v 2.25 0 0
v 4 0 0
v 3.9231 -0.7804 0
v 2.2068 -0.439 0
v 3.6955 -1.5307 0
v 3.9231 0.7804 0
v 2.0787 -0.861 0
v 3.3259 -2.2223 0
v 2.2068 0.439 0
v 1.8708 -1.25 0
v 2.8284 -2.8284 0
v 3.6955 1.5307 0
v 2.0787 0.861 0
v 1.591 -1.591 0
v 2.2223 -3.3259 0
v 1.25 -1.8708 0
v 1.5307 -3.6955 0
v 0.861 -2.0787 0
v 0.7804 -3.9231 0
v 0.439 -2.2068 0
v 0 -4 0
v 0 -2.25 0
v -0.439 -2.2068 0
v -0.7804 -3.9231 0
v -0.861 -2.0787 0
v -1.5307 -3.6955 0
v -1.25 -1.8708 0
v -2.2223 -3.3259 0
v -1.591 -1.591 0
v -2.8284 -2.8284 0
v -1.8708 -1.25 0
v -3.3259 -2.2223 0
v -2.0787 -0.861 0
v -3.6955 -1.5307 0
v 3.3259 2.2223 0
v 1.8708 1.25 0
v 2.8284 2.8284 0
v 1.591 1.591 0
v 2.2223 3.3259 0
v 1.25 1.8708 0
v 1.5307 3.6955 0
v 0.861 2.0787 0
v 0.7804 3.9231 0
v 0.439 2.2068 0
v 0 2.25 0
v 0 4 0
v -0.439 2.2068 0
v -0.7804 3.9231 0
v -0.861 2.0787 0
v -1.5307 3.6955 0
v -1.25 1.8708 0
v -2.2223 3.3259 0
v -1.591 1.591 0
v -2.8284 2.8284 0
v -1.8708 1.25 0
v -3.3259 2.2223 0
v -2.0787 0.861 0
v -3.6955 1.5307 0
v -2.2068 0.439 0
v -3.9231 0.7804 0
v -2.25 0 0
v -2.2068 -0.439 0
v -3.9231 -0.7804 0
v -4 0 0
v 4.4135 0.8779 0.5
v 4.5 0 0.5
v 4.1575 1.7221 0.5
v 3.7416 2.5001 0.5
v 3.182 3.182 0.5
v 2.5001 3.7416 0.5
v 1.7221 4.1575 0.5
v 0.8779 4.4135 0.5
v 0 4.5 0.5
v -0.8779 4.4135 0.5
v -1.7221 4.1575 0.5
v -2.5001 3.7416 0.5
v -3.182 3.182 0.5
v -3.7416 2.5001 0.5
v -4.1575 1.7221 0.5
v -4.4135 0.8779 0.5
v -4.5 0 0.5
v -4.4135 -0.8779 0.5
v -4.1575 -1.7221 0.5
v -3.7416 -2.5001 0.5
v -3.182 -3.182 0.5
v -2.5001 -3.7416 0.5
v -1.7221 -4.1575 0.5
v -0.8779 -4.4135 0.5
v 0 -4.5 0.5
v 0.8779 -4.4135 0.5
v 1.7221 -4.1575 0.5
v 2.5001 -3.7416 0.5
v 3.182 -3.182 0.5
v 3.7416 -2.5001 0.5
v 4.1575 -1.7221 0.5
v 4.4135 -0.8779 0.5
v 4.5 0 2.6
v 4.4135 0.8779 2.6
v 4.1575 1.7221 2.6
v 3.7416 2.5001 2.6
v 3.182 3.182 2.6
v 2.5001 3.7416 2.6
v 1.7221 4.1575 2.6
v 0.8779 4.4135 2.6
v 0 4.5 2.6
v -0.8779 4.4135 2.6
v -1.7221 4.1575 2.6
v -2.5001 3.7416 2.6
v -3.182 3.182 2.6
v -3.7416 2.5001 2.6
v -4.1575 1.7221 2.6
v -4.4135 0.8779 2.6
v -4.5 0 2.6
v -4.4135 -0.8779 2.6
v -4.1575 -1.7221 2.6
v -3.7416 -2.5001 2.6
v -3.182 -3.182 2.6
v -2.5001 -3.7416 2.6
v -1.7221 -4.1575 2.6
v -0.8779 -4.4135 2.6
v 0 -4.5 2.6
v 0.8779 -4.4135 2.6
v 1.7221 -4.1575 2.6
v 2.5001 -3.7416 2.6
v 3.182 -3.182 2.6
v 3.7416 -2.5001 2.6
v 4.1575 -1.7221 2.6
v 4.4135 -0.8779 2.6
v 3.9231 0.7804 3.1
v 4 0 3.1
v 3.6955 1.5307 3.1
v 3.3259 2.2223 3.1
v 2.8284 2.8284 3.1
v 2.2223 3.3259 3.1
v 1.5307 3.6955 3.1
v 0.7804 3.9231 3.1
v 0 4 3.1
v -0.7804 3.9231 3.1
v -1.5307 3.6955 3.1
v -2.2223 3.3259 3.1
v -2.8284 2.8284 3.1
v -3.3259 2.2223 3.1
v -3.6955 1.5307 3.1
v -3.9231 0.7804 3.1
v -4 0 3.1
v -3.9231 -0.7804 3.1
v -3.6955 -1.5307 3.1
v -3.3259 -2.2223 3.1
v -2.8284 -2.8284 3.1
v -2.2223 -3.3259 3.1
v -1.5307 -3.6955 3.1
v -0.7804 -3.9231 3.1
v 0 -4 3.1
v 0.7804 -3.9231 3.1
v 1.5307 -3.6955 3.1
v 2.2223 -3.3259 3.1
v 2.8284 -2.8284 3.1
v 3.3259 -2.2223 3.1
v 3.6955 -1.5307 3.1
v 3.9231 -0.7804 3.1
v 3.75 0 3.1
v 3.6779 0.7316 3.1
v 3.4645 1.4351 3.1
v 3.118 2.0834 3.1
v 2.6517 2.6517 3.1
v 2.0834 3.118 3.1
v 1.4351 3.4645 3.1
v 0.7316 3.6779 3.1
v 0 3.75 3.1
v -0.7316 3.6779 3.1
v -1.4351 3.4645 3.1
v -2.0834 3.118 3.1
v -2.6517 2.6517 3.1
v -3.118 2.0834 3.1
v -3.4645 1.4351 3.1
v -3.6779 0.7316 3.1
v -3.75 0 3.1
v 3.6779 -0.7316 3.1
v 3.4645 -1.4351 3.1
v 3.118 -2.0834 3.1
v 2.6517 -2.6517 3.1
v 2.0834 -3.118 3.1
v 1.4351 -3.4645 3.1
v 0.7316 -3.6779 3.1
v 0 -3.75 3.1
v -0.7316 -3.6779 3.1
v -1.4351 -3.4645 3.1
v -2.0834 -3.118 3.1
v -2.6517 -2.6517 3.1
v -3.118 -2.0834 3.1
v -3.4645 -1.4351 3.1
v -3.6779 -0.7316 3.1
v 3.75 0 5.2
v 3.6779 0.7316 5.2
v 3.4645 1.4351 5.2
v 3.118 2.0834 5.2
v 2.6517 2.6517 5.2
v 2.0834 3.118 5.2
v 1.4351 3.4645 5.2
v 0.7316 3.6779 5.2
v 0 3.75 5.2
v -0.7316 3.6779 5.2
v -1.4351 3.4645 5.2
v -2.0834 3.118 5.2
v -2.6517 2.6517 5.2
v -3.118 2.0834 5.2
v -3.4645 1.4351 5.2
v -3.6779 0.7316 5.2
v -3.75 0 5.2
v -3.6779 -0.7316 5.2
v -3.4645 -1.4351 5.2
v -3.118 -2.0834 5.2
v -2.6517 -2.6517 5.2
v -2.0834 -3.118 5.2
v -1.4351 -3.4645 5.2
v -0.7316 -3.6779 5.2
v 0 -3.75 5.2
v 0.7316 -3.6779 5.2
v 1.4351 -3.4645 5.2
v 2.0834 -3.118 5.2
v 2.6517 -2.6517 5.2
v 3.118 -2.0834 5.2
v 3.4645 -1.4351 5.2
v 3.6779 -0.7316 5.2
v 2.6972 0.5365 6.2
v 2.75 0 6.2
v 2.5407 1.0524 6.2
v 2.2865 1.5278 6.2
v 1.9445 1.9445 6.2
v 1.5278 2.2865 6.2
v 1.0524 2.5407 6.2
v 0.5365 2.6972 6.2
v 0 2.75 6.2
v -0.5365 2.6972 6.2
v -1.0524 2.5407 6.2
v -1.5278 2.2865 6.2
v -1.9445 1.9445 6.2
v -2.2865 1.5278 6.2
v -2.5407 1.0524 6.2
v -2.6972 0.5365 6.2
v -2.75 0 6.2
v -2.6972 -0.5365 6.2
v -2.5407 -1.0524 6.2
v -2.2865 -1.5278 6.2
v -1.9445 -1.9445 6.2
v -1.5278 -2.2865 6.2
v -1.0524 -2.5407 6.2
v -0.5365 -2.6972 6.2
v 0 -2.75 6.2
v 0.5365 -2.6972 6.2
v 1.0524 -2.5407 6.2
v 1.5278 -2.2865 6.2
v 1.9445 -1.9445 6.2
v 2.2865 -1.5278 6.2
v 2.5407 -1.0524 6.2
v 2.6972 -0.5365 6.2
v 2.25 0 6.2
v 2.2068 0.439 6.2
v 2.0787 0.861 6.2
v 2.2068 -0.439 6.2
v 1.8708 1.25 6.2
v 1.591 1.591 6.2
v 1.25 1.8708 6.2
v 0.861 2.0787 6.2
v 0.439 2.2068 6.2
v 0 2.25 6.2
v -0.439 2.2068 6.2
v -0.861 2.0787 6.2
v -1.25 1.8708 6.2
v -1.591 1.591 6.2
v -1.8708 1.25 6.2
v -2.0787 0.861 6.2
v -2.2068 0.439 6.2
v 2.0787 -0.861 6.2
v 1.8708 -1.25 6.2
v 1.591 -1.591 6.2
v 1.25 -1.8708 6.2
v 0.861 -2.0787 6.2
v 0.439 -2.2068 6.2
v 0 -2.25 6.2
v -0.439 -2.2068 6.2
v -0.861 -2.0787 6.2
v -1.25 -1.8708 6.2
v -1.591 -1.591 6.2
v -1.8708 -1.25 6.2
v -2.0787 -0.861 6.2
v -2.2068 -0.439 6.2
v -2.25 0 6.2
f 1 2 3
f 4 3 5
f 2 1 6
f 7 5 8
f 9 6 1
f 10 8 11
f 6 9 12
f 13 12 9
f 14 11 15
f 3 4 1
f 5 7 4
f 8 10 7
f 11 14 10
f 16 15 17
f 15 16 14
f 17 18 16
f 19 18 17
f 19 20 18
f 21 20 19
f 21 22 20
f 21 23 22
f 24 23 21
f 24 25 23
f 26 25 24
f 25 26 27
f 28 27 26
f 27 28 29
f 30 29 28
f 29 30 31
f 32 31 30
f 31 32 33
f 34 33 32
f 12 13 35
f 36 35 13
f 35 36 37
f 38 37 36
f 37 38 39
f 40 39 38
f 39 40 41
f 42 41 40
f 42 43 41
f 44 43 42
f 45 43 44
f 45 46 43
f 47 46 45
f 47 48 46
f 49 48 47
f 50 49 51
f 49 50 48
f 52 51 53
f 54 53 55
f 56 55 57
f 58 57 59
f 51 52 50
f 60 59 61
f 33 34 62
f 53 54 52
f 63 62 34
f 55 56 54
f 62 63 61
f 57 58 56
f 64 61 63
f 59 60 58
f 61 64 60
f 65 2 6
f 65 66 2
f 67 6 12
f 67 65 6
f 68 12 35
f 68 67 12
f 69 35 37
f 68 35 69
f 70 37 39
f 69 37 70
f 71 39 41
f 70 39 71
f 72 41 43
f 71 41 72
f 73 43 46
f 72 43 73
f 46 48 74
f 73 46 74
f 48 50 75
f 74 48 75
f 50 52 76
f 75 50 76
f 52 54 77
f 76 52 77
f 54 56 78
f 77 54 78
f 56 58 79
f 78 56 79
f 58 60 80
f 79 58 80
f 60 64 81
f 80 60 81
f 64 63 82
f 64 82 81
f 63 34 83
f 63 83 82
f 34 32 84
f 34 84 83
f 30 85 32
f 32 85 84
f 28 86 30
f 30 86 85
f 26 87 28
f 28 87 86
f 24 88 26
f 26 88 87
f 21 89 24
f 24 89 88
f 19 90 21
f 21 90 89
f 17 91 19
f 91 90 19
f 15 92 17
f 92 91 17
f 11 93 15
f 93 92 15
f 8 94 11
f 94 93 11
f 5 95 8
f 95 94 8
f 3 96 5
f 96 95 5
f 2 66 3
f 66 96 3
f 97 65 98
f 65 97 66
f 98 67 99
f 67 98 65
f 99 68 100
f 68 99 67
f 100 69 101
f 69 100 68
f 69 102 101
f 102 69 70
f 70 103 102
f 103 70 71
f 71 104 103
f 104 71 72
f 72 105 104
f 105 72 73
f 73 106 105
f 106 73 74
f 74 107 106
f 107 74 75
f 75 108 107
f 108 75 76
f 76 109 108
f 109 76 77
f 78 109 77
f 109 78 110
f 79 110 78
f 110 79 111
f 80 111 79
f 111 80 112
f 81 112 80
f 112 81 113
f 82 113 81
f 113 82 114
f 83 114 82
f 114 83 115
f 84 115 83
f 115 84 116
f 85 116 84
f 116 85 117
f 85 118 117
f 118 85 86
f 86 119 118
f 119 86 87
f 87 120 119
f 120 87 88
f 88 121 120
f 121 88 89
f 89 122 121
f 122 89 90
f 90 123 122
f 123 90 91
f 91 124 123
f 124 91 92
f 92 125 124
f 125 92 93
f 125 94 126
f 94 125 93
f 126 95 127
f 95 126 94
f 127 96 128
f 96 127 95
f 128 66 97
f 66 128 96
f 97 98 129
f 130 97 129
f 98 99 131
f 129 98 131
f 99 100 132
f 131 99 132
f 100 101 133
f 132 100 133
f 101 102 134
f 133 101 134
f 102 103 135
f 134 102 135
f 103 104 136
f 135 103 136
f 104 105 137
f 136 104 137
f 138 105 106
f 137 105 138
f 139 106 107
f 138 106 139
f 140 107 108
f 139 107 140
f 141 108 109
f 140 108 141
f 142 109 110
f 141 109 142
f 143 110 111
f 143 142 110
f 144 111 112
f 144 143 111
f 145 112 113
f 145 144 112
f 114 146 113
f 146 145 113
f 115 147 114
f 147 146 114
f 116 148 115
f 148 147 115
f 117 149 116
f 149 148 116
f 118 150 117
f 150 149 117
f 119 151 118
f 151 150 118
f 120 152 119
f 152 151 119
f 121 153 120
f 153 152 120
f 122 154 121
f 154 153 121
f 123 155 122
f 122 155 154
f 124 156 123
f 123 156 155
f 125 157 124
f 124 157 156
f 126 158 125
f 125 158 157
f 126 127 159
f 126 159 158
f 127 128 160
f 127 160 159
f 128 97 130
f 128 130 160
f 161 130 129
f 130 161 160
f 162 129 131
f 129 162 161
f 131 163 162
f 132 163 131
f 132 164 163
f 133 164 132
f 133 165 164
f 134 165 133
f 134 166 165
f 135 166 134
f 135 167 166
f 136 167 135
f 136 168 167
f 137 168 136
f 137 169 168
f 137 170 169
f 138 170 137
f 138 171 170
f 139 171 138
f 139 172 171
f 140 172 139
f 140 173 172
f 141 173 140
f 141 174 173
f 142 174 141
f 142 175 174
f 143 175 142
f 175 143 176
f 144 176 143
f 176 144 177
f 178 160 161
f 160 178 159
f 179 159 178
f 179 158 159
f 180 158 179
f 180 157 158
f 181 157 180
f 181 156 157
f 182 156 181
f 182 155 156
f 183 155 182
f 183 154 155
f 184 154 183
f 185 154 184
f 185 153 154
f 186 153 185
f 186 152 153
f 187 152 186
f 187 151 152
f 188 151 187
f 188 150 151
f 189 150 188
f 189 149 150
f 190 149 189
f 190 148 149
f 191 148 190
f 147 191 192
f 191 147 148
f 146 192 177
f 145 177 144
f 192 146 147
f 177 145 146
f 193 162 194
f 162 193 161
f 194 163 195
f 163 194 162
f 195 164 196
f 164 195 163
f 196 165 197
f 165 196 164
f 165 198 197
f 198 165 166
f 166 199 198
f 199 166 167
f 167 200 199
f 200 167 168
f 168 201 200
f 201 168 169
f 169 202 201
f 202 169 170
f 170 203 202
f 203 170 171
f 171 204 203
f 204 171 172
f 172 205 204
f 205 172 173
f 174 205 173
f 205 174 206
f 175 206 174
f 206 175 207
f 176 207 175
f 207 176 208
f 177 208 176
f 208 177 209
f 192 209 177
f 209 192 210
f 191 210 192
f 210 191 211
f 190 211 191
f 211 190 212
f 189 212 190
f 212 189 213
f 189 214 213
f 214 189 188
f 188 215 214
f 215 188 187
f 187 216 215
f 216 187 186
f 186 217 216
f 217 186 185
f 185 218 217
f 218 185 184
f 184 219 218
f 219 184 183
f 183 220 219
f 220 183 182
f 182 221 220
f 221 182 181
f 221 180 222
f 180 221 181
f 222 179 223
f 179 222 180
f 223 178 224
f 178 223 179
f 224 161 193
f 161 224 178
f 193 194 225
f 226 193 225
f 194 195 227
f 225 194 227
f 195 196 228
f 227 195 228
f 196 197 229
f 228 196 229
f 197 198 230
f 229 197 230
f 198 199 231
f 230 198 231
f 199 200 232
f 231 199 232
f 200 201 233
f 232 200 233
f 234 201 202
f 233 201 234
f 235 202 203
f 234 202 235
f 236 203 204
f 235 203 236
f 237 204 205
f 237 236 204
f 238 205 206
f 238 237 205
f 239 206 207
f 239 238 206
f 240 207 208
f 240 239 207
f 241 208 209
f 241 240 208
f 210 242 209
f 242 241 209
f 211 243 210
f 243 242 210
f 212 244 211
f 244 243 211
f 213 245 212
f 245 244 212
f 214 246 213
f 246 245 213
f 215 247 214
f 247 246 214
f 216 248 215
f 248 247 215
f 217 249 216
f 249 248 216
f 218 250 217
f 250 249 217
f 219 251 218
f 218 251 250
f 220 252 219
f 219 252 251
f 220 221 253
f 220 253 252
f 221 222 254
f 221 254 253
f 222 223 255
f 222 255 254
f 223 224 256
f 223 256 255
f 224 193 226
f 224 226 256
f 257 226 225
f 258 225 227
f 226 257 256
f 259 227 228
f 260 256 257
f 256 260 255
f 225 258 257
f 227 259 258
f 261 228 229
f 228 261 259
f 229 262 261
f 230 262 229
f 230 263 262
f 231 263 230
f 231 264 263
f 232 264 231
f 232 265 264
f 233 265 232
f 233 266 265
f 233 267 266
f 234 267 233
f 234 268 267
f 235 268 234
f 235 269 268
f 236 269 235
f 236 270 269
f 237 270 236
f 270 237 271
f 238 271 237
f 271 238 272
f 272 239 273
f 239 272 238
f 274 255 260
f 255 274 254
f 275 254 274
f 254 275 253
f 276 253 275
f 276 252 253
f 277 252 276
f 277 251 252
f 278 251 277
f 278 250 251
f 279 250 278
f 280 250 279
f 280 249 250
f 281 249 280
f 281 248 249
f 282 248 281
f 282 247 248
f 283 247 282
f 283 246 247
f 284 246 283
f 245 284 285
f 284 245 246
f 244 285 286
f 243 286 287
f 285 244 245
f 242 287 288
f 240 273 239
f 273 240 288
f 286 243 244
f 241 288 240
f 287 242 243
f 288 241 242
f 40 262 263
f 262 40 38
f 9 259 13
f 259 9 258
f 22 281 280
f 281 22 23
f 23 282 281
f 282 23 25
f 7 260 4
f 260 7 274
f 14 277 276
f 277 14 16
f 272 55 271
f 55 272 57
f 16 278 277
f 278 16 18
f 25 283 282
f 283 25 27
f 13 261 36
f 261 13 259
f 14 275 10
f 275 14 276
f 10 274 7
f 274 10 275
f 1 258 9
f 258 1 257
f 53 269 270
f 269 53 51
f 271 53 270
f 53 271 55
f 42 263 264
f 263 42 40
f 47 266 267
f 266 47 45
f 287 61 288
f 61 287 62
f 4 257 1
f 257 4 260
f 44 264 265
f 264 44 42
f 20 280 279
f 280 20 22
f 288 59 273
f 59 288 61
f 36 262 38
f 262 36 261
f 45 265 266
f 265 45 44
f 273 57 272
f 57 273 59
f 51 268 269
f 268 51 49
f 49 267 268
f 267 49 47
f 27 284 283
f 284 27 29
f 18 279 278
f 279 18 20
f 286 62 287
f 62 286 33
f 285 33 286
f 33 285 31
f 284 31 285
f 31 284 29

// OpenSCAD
// file: ../lib/TOGMod1Constructors.scad
// TOGMod1Constructors-v1.7
// 
// Functions to construct objects understood by TOGMod1
// 
// v1.1:
// - Add togmod1_make_rounded_rect
// v1.2:
// - togmod1_make_rounded_rect can make ovals
// v1.3:
// - togmod1_circle_points, to just get the points of a circle
// - if pos parameter to circle function has a third element,
//   returned vertexes will include it as the z component;
// v1.3.1
// - Some assertions
// v1.4:
// - Refactor togmod1_rounded_rect_points and togmod1_circle_points
//   to use togmod1__make_nd_vector_adder for adapting to whatever
//   `pos` parameter is.
// v1.5:
// - togmod_rounded_rect_points will not simplify completely rounded sides
//   (where length of side is exactly twice the rounding radius)
//   unless simplify_rounded_sides=true
//   - This makes it more useful for polyhedron generation,
//     where radius varies, but number of points must remain constant.
// v1.6:
// - togmod1_make_rect makes a simple rectangle
// - togmod1_make_rounded_rect will defer to togmod1_make_rect when r=0
// v1.7:
// - togmod1_make_circle will return empty shape (["union"]) when d=0

use <./TOGArrayLib1.scad>

function togmod1__make_nd_vector_adder(origin=[0,0]) =
	let(origin_is_zero = tal1_reduce(true, origin, function(prev,item) prev && item == 0))
	origin_is_zero ? (function(vec) len(vec) >= len(origin) ? vec : tal1_replace_at(origin, 0, vec)) :
	function(vec) [
		for(i=[0:1:max(len(origin),len(vec))-1]) (len(vec) > i ? vec[i] : 0) + (len(origin) > i ? origin[i] : 0),
	];

assert([1,2,3] == togmod1__make_nd_vector_adder()([1,2,3]));
echo(togmod1__make_nd_vector_adder([0,0,3])([1,2]));
assert([1,2,3] == togmod1__make_nd_vector_adder([0,0,3])([1,2]));


function togmod1_make_cuboid(size) =
	assert(is_list(size))
	assert(len(size) >= 3)
	assert(is_num(size[0]))
	assert(is_num(size[1]))
	assert(is_num(size[2]))
	["polyhedron-vf", [
		[-size[0]/2, -size[1]/2, -size[2]/2],
		[+size[0]/2, -size[1]/2, -size[2]/2],
		[-size[0]/2, +size[1]/2, -size[2]/2],
		[+size[0]/2, +size[1]/2, -size[2]/2],
		[-size[0]/2, -size[1]/2, +size[2]/2],
		[+size[0]/2, -size[1]/2, +size[2]/2],
		[-size[0]/2, +size[1]/2, +size[2]/2],
		[+size[0]/2, +size[1]/2, +size[2]/2]
	], [
		[0,1,3,2],[0,4,5,1],[4,6,7,5],[3,7,6,2],[1,5,7,3],[6,4,0,2]
	]];

function togmod1_make_polygon(verts) =
	["polygon-vp", verts, [[for( i=[0:1:len(verts)-1] ) i%len(verts)]]];

function togmod1_rounded_rect_points(size, r, pos=[0,0], simplify_rounded_sides=false) =
	assert(is_list(size))
	assert(len(size) >= 2)
	let(radii = is_list(r) ? r : is_num(r) ? [r,r] : assert(false, "rounded_rect r(adius) should be list<num> or num"))
	let(rx = radii[0])
	let(ry = radii[1])
	assert(is_num(rx))
	assert(is_num(ry))
	assert(size[0] >= 2*rx, str("size[0] must be >= 2*r[0]; size[0] = ",size[0],", 2*r[0] = ",2*rx))
	assert(size[1] >= 2*ry, str("size[1] must be >= 2*r[1]; size[1] = ",size[1],", 2*r[1] = ",2*ry))
	let(quarterfn=max($fn/4, 1))
	let(qfnx = simplify_rounded_sides && size[0] == 2*rx ? quarterfn-1 : quarterfn)
	let(qfny = simplify_rounded_sides && size[1] == 2*ry ? quarterfn-1 : quarterfn)
	let(finalizepos = togmod1__make_nd_vector_adder(pos))
[
	for(a=[0 : 1 : qfnx]) let(ang=      a*90/quarterfn) finalizepos([ size[0]/2-rx + rx*cos(ang),  size[1]/2-ry + ry*sin(ang)]),
	for(a=[0 : 1 : qfny]) let(ang= 90 + a*90/quarterfn) finalizepos([-size[0]/2+rx + rx*cos(ang),  size[1]/2-ry + ry*sin(ang)]),
	for(a=[0 : 1 : qfnx]) let(ang=180 + a*90/quarterfn) finalizepos([-size[0]/2+rx + rx*cos(ang), -size[1]/2+ry + ry*sin(ang)]),
	for(a=[0 : 1 : qfny]) let(ang=270 + a*90/quarterfn) finalizepos([ size[0]/2-rx + rx*cos(ang), -size[1]/2+ry + ry*sin(ang)]),
];

function togmod1_make_rect(size) =
	togmod1_make_polygon([
		[-size[0]/2, -size[1]/2],
		[+size[0]/2, -size[1]/2],
		[+size[0]/2, +size[1]/2],
		[-size[0]/2, +size[1]/2],
	]);

function togmod1_make_rounded_rect(size, r) =
	r == 0 ? togmod1_make_rect(size) :
	togmod1_make_polygon(togmod1_rounded_rect_points(size,r,simplify_rounded_sides=true));

function togmod1_circle_points(r, pos=[0,0], d=undef) =
	assert( !is_undef(r) || !is_undef(d) )
	assert(!is_undef(pos[0]))
	assert(!is_undef(pos[1]))
	let(finalizepos = togmod1__make_nd_vector_adder(pos))
	let(r_ = !is_undef(r) ? r : d/2)
	let(fn = max($fn, 6))
	[for(i=[0 : 1 : fn-1]) finalizepos([r_*cos(i*360/fn), r_*sin(i*360/fn)])];

function togmod1_make_circle(r, pos=[0,0], d=undef) =
	r == 0 || d == 0 ? ["union"] :
	togmod1_make_polygon(togmod1_circle_points(r=r, pos=pos, d=d));

function togmod1_make_cylinder(d, zrange=[0,1], r=undef, pos=[0,0]) =
	assert( !is_undef(r) || !is_undef(d) )
	let( r_ = !is_undef(r) ? r : d/2 )
	// TODO: Make polyhedron directly
	["linear-extrude-zs", zrange, togmod1_make_circle(r=r_, pos=pos)];

function togmod1__is_range1d(range) = is_list(range) && len(range) == 2 && is_num(range[0]) && is_num(range[1]);

function togmod1_linear_extrude_z(range, shape) =
	assert(togmod1__is_range1d(range))
	["linear-extrude-zs", range, shape];
function togmod1_linear_extrude_x(range, shape) =
	assert(togmod1__is_range1d(range))
	["rotate", [90, 0, 90], togmod1_linear_extrude_z(range, shape)];
function togmod1_linear_extrude_y(range, shape) =
	assert(togmod1__is_range1d(range))
	["rotate", [90, 0, 180], togmod1_linear_extrude_z(range, shape)];
// file: ../lib/TOGArrayLib1.scad
// TOGArrayLib1.4
// 
// Functions for working with arrays.
// 
// v1.1:
// - tal1_reduce assert(is_list(items)) to prevent infinite recursion
//   when given undefined or other non-list values
// v1.1.1:
// - Fix tal1_uniq_remap_v2 to return "list-remap-result" as the
//   first element of the returned list
// v1.2:
// - Add tal1_replace_at function
// v1.3:
// - tal1_is_vec_of, tal1_is_vec_of_num
// v1.4:
// - tal1_assert_for_each, for when you want to assert something
//   about each of a list of items and get nice failure messages

/**
 * Make a list with the contents of list `a`,
 * but starting at offset `off`, replaced by the contents of list `b`.
 * len(result) = max(len(a), off+len(b))
 */
function tal1_replace_at(a, off, b, default_value=undef, default_value_function=undef) =
	assert(is_list(a))
	assert(is_list(b))
	let( _dvf = !is_undef(default_value_function) ? default_value_function : function(i) default_value )
[
	for( i=[0:1:min(off,len(a))-1] ) a[i],
	for( i=[len(a):1:off-1] ) _dvf(i),
	for( i=[off:1:off+len(b)-1] ) b[i-off],
	for( i=[off+len(b):1:len(a)-1] ) a[i],
];

// Simplest case
assert([] == tal1_replace_at([], 0, []));
// Second simplest cases
assert(["foo"] == tal1_replace_at(["foo"], 0, []));
assert(["foo"] == tal1_replace_at([], 0, ["foo"]));
// Replace one item
assert(["foo","quux","baz"] == tal1_replace_at(["foo","bar","baz"], 1, ["quux"]));
// Replace and extend
assert(["foo","quux","tuna","tina"] == tal1_replace_at(["foo","bar","baz"], 1, ["quux", "tuna", "tina"]));
// Add beyond end of `a`
assert(["foo","zzz","quux"] == tal1_replace_at(["foo"], 2, ["quux"], default_value="zzz"));
// Adding 'nothing' should still fill to that point with defaults
assert(["foo","zzz","zzz"] == tal1_replace_at(["foo"], 3, [], default_value="zzz"));


function tal1_reduce(start, items, func, offset=0) =
	assert(is_list(items))
	len(items) == offset ? start :
	tal1_reduce(func(start, items[offset]), items, func, offset+1);

function tal1_consecutive_duplicate_count(items) = tal1_reduce(
	[0, undef],
	items,
	function(z,item) [z[0] + (item == z[1] ? 1 : 0), item]
)[0];

assert(0 == tal1_consecutive_duplicate_count([]));
assert(0 == tal1_consecutive_duplicate_count([50]));
assert(1 == tal1_consecutive_duplicate_count([50,50]));
assert(0 == tal1_consecutive_duplicate_count([50,51,52,53]));
assert(1 == tal1_consecutive_duplicate_count([50,51,52,52]));
assert(3 == tal1_consecutive_duplicate_count([50,50,50,50]));

// Set test_size to arbirarily large values
// to ensure that OpenSCAD can handle heavy recursion
let(test_size=1000) assert(test_size/2 == tal1_consecutive_duplicate_count([for(i=[0:1:test_size-1]) floor(i/2)]));



function tal1_uniq_(items, off0, off1) =
	let(chunklen = off1-off0)
	chunklen == 0 ? [] :
	chunklen == 1 ? [items[off0]] :
	let(half=floor(chunklen/2))
	let(left  = tal1_uniq_(items, off0     , off0+half))
	let(right = tal1_uniq_(items, off0+half, off1     ))
	assert(len(left) > 0)
	assert(len(right) > 0)
	left[len(left)-1] == right[0] ? [each left, for(i=[1:1:len(right)-1]) right[i]] :
	[each left, each right];

/** Given a list of items, returns a new list with identical consecutive items merged */
function tal1_uniq(items) = tal1_uniq_(items, 0, len(items));

assert([] == tal1_uniq([]));
assert([123] == tal1_uniq([123]));
assert([55,0,1,2,3] == tal1_uniq([55,0,1,2,3]));
assert([55,0,1,2] == tal1_uniq([55,0,1,1,2]));
assert([55,0,1] == tal1_uniq([55,55,0,0,0,0,0,0,1,1,1,1]));
assert([55,0] == tal1_uniq([55,0,0,0,0,0,0,0]));



/**
 * Returns [new items, old index -> new index mapping].
 * No-op version.
 */
function tal1_uniq_remap_v1(items) =
	["list-remap-result", items, [for (vi=[0:1:len(items)-1]) vi]];

// [a, a, b, b, c, c]
//
// [a,    ...], []  -> [a],[0]
// [a, a, ...], [0] -> [a],[0,0]

assert([1,2,3] == [1,2,3]);

/**
 * Recursive version that will combine adjacent identical vertexes,
 * but will use the original items.
 */
function tal1_uniq_remap_v2(items, map=[]) =
	let(index = len(map))
	len(items) == index ? ["list-remap-result", items, map] :
	index == 0 ? tal1_uniq_remap_v2(items, [0]) :
	items[index] == items[map[index-1]] ? tal1_uniq_remap_v2(items, [for(vi=map) vi, map[index-1]]) :
	tal1_uniq_remap_v2(items, [for(vi=map) vi, index]);

assert(tal1_uniq_remap_v2([1,1,2,2,3,4]) == ["list-remap-result", [1,1,2,2,3,4], [0,0,2,2,4,5]]);


/**
 * Returns true if `vec` is a list of at least min_len items
 * and component_check(each item, even those beyond min_len) is true.
 */
function tal1_is_vec_of(vec, min_len=0, component_check=function(x) true) =
	assert(is_num(min_len) && min_len >= 0)
	assert(is_function(component_check))
	is_list(vec) && len(vec) >= min_len &&
	tal1_reduce(true, vec, function(prev,item) prev && component_check(item));

function tal1_is_vec_of_num(vec, min_len=0) = tal1_is_vec_of(vec, min_len, function(i) is_num(i));

assert( true == tal1_is_vec_of_num([1,2,3]));
assert( true == tal1_is_vec_of_num([]));
assert( true == tal1_is_vec_of_num([1,2,3], 3));
assert(false == tal1_is_vec_of_num([1,2], 3));
assert(false == tal1_is_vec_of_num([1,2,"spoon"], 3));
// Requirements are ambiguous when
// first min_len items are numbers, but there are non-numeric items afterwards,
// so let's error on the side of saying 'no, it's not a list of numbers';
// i.e. the item check and the min_len are independent.
assert(false == tal1_is_vec_of_num([1,2,3,"artichoke"], 3));


/**
 * Asserts that item_checker(each item in list, index of item)[0] is true.
 * Second element of item_checker return value is assertion message.
 * Returns the original list, in case that's useful to you.
 */
function tal1_assert_for_each(list, item_checker) =
	let( _ignored = [ for(i=[0:1:len(list)-1])
		let(q=item_checker(list[i],i))
		let(passed=is_bool(q) ? q : is_list(q) ? q[0] : assert(false, str(
			"tal1_assert_for_each: item_checker should return Bool|[Bool,String], but returned ",
			q, " for item at index ", i)))
		let(message=is_list(q) ? q[1] : undef)
		assert(passed, message)
		q
	])
	list;

// Callback can return a boolean...
assert([1,2,3] == tal1_assert_for_each([1,2,3], function(v,i) is_num(v)));
// ...or a [boolean, string]
assert([1,2,3] == tal1_assert_for_each([1,2,3], function(v,i) [is_num(v), "element be a num"]));
// file: ../lib/TOGMod1.scad
// TOGMod1
// OpenSCAD library for representing shapes
// 
// See also: Functional OpenSCAD (https://github.com/thehans/FunctionalOpenSCAD)

module togmod1_domodule(mod) {
	assert(is_list(mod));
	assert(len(mod) > 0);
	if( mod[0] == "polygon-vp" ) {
		// ["polygon-vp", vertexes, paths]
		polygon(points=mod[1], paths=mod[2]);
	} else if( mod[0] == "polyhedron-vf" ) {
		polyhedron(mod[1], faces=mod[2]);
	} else if( mod[0] == "scale" ) {
		assert(len(mod) == 3);
		scale(mod[1]) togmod1_domodule(mod[2]);
	} else if( mod[0] == "translate" ) {
		assert(len(mod) == 3);
		assert(is_list(mod[1]));
		for(c=mod[1]) assert(is_num(c), "translate component should be numeric");
		translate(mod[1]) togmod1_domodule(mod[2]);
	} else if( mod[0] == "rotate" ) {
		assert(len(mod) == 3);
		rotate(mod[1]) togmod1_domodule(mod[2]);
	} else if( mod[0] == "intersection" ) {
		intersection_for( i=[1:1:len(mod)-1] ) togmod1_domodule(mod[i]);
	} else if( mod[0] == "difference" ) {
		difference() {
			togmod1_domodule(mod[1]);
			for( i=[2:1:len(mod)-1] ) togmod1_domodule(mod[i]);
		}
	} else if( mod[0] == "union" ) {
		for( i=[1:1:len(mod)-1] ) togmod1_domodule(mod[i]);
	} else if( mod[0] == "hull" ) {
		hull() for( i=[1:1:len(mod)-1] ) togmod1_domodule(mod[i]);
	} else if( mod[0] == "offset-rs" ) {
		assert(len(mod) == 3);
		assert(is_num(mod[1]));
		assert(is_list(mod[2]));
		offset(mod[1]) togmod1_domodule(mod[2]);
	} else if( mod[0] == "linear-extrude-zs" ) {
		// ["linear-extrude-zs", [z0,z1], 2d_shape] // centered
		// ["linear-extrude-zs", height, 2d_shape]
		let( zrange = is_list(mod[1]) ? mod[1] : [-mod[1]/2, mod[1]/2] ) {
			translate([0,0,zrange[0]]) linear_extrude(zrange[1]-zrange[0]) togmod1_domodule(mod[2]);
		}
	} else if( mod[0] == "render" ) {
		render() togmod1_domodule(mod[1]);
	} else if( mod[0] == "minkowski" ) {
		minkowski() {
			togmod1_domodule(mod[1]);
			togmod1_domodule(mod[2]);
		}
	} else if( mod[0] == "x-debug" ) {
		# togmod1_domodule(mod[1]);
	} else if( mod[0] == "x-color" ) {
		color(mod[1]) togmod1_domodule(mod[2]);
	} else {
		assert(false, str("Unrecognized shape: ", mod[0]));
	}
}
// main file
// AdapterWasher1.2
// 
// Has a smaller hole for a smaller screw,
// and fits into larger holes
// 
// Versions:
// v1.1:
// - Configurable, zero-able bevels
// v1.2:
// - Indicate 0.1 precision for configuration parameters

hole_diameter   = 4.5; // 0.1
post_diameter   = 7.5; // 0.1
post_height     = 3.1; // 0.1
// Max size of bevel on tip of post
post_bevel      = 1.0; // 0.1
flange_diameter = 9.0; // 0.1
flange_height   = 3.1; // 0.1
// Max size of bevel on top/bottom of flange
flange_bevel    = 1.0; // 0.1
$fn = 32;

use <../lib/TOGMod1.scad>
use <../lib/TOGPolyhedronLib1.scad>

togmod1_domodule(
// fb_a = flange_bevel (actual value)
let( fb_a = min(flange_bevel, flange_height/3, (flange_diameter-post_diameter)/3) )
let( pb_a   = min(post_bevel,   post_height/2,                   post_diameter/3) )
let( total_height = flange_height + post_height )
["difference",
	tphl1_make_z_cylinder(zds=[
		             [0                   , flange_diameter - fb_a*2],
		if(fb_a > 0) [fb_a                , flange_diameter         ],
		if(fb_a > 0) [flange_height - fb_a, flange_diameter         ],
		             [flange_height       , flange_diameter - fb_a*2],
		             [flange_height       , post_diameter           ],
		             [total_height - pb_a , post_diameter           ],
		if(pb_a > 0) [total_height        , post_diameter   - pb_a*2],
	]),
	
	tphl1_make_z_cylinder(zrange=[-1, total_height+1], d=hole_diameter),
]);
